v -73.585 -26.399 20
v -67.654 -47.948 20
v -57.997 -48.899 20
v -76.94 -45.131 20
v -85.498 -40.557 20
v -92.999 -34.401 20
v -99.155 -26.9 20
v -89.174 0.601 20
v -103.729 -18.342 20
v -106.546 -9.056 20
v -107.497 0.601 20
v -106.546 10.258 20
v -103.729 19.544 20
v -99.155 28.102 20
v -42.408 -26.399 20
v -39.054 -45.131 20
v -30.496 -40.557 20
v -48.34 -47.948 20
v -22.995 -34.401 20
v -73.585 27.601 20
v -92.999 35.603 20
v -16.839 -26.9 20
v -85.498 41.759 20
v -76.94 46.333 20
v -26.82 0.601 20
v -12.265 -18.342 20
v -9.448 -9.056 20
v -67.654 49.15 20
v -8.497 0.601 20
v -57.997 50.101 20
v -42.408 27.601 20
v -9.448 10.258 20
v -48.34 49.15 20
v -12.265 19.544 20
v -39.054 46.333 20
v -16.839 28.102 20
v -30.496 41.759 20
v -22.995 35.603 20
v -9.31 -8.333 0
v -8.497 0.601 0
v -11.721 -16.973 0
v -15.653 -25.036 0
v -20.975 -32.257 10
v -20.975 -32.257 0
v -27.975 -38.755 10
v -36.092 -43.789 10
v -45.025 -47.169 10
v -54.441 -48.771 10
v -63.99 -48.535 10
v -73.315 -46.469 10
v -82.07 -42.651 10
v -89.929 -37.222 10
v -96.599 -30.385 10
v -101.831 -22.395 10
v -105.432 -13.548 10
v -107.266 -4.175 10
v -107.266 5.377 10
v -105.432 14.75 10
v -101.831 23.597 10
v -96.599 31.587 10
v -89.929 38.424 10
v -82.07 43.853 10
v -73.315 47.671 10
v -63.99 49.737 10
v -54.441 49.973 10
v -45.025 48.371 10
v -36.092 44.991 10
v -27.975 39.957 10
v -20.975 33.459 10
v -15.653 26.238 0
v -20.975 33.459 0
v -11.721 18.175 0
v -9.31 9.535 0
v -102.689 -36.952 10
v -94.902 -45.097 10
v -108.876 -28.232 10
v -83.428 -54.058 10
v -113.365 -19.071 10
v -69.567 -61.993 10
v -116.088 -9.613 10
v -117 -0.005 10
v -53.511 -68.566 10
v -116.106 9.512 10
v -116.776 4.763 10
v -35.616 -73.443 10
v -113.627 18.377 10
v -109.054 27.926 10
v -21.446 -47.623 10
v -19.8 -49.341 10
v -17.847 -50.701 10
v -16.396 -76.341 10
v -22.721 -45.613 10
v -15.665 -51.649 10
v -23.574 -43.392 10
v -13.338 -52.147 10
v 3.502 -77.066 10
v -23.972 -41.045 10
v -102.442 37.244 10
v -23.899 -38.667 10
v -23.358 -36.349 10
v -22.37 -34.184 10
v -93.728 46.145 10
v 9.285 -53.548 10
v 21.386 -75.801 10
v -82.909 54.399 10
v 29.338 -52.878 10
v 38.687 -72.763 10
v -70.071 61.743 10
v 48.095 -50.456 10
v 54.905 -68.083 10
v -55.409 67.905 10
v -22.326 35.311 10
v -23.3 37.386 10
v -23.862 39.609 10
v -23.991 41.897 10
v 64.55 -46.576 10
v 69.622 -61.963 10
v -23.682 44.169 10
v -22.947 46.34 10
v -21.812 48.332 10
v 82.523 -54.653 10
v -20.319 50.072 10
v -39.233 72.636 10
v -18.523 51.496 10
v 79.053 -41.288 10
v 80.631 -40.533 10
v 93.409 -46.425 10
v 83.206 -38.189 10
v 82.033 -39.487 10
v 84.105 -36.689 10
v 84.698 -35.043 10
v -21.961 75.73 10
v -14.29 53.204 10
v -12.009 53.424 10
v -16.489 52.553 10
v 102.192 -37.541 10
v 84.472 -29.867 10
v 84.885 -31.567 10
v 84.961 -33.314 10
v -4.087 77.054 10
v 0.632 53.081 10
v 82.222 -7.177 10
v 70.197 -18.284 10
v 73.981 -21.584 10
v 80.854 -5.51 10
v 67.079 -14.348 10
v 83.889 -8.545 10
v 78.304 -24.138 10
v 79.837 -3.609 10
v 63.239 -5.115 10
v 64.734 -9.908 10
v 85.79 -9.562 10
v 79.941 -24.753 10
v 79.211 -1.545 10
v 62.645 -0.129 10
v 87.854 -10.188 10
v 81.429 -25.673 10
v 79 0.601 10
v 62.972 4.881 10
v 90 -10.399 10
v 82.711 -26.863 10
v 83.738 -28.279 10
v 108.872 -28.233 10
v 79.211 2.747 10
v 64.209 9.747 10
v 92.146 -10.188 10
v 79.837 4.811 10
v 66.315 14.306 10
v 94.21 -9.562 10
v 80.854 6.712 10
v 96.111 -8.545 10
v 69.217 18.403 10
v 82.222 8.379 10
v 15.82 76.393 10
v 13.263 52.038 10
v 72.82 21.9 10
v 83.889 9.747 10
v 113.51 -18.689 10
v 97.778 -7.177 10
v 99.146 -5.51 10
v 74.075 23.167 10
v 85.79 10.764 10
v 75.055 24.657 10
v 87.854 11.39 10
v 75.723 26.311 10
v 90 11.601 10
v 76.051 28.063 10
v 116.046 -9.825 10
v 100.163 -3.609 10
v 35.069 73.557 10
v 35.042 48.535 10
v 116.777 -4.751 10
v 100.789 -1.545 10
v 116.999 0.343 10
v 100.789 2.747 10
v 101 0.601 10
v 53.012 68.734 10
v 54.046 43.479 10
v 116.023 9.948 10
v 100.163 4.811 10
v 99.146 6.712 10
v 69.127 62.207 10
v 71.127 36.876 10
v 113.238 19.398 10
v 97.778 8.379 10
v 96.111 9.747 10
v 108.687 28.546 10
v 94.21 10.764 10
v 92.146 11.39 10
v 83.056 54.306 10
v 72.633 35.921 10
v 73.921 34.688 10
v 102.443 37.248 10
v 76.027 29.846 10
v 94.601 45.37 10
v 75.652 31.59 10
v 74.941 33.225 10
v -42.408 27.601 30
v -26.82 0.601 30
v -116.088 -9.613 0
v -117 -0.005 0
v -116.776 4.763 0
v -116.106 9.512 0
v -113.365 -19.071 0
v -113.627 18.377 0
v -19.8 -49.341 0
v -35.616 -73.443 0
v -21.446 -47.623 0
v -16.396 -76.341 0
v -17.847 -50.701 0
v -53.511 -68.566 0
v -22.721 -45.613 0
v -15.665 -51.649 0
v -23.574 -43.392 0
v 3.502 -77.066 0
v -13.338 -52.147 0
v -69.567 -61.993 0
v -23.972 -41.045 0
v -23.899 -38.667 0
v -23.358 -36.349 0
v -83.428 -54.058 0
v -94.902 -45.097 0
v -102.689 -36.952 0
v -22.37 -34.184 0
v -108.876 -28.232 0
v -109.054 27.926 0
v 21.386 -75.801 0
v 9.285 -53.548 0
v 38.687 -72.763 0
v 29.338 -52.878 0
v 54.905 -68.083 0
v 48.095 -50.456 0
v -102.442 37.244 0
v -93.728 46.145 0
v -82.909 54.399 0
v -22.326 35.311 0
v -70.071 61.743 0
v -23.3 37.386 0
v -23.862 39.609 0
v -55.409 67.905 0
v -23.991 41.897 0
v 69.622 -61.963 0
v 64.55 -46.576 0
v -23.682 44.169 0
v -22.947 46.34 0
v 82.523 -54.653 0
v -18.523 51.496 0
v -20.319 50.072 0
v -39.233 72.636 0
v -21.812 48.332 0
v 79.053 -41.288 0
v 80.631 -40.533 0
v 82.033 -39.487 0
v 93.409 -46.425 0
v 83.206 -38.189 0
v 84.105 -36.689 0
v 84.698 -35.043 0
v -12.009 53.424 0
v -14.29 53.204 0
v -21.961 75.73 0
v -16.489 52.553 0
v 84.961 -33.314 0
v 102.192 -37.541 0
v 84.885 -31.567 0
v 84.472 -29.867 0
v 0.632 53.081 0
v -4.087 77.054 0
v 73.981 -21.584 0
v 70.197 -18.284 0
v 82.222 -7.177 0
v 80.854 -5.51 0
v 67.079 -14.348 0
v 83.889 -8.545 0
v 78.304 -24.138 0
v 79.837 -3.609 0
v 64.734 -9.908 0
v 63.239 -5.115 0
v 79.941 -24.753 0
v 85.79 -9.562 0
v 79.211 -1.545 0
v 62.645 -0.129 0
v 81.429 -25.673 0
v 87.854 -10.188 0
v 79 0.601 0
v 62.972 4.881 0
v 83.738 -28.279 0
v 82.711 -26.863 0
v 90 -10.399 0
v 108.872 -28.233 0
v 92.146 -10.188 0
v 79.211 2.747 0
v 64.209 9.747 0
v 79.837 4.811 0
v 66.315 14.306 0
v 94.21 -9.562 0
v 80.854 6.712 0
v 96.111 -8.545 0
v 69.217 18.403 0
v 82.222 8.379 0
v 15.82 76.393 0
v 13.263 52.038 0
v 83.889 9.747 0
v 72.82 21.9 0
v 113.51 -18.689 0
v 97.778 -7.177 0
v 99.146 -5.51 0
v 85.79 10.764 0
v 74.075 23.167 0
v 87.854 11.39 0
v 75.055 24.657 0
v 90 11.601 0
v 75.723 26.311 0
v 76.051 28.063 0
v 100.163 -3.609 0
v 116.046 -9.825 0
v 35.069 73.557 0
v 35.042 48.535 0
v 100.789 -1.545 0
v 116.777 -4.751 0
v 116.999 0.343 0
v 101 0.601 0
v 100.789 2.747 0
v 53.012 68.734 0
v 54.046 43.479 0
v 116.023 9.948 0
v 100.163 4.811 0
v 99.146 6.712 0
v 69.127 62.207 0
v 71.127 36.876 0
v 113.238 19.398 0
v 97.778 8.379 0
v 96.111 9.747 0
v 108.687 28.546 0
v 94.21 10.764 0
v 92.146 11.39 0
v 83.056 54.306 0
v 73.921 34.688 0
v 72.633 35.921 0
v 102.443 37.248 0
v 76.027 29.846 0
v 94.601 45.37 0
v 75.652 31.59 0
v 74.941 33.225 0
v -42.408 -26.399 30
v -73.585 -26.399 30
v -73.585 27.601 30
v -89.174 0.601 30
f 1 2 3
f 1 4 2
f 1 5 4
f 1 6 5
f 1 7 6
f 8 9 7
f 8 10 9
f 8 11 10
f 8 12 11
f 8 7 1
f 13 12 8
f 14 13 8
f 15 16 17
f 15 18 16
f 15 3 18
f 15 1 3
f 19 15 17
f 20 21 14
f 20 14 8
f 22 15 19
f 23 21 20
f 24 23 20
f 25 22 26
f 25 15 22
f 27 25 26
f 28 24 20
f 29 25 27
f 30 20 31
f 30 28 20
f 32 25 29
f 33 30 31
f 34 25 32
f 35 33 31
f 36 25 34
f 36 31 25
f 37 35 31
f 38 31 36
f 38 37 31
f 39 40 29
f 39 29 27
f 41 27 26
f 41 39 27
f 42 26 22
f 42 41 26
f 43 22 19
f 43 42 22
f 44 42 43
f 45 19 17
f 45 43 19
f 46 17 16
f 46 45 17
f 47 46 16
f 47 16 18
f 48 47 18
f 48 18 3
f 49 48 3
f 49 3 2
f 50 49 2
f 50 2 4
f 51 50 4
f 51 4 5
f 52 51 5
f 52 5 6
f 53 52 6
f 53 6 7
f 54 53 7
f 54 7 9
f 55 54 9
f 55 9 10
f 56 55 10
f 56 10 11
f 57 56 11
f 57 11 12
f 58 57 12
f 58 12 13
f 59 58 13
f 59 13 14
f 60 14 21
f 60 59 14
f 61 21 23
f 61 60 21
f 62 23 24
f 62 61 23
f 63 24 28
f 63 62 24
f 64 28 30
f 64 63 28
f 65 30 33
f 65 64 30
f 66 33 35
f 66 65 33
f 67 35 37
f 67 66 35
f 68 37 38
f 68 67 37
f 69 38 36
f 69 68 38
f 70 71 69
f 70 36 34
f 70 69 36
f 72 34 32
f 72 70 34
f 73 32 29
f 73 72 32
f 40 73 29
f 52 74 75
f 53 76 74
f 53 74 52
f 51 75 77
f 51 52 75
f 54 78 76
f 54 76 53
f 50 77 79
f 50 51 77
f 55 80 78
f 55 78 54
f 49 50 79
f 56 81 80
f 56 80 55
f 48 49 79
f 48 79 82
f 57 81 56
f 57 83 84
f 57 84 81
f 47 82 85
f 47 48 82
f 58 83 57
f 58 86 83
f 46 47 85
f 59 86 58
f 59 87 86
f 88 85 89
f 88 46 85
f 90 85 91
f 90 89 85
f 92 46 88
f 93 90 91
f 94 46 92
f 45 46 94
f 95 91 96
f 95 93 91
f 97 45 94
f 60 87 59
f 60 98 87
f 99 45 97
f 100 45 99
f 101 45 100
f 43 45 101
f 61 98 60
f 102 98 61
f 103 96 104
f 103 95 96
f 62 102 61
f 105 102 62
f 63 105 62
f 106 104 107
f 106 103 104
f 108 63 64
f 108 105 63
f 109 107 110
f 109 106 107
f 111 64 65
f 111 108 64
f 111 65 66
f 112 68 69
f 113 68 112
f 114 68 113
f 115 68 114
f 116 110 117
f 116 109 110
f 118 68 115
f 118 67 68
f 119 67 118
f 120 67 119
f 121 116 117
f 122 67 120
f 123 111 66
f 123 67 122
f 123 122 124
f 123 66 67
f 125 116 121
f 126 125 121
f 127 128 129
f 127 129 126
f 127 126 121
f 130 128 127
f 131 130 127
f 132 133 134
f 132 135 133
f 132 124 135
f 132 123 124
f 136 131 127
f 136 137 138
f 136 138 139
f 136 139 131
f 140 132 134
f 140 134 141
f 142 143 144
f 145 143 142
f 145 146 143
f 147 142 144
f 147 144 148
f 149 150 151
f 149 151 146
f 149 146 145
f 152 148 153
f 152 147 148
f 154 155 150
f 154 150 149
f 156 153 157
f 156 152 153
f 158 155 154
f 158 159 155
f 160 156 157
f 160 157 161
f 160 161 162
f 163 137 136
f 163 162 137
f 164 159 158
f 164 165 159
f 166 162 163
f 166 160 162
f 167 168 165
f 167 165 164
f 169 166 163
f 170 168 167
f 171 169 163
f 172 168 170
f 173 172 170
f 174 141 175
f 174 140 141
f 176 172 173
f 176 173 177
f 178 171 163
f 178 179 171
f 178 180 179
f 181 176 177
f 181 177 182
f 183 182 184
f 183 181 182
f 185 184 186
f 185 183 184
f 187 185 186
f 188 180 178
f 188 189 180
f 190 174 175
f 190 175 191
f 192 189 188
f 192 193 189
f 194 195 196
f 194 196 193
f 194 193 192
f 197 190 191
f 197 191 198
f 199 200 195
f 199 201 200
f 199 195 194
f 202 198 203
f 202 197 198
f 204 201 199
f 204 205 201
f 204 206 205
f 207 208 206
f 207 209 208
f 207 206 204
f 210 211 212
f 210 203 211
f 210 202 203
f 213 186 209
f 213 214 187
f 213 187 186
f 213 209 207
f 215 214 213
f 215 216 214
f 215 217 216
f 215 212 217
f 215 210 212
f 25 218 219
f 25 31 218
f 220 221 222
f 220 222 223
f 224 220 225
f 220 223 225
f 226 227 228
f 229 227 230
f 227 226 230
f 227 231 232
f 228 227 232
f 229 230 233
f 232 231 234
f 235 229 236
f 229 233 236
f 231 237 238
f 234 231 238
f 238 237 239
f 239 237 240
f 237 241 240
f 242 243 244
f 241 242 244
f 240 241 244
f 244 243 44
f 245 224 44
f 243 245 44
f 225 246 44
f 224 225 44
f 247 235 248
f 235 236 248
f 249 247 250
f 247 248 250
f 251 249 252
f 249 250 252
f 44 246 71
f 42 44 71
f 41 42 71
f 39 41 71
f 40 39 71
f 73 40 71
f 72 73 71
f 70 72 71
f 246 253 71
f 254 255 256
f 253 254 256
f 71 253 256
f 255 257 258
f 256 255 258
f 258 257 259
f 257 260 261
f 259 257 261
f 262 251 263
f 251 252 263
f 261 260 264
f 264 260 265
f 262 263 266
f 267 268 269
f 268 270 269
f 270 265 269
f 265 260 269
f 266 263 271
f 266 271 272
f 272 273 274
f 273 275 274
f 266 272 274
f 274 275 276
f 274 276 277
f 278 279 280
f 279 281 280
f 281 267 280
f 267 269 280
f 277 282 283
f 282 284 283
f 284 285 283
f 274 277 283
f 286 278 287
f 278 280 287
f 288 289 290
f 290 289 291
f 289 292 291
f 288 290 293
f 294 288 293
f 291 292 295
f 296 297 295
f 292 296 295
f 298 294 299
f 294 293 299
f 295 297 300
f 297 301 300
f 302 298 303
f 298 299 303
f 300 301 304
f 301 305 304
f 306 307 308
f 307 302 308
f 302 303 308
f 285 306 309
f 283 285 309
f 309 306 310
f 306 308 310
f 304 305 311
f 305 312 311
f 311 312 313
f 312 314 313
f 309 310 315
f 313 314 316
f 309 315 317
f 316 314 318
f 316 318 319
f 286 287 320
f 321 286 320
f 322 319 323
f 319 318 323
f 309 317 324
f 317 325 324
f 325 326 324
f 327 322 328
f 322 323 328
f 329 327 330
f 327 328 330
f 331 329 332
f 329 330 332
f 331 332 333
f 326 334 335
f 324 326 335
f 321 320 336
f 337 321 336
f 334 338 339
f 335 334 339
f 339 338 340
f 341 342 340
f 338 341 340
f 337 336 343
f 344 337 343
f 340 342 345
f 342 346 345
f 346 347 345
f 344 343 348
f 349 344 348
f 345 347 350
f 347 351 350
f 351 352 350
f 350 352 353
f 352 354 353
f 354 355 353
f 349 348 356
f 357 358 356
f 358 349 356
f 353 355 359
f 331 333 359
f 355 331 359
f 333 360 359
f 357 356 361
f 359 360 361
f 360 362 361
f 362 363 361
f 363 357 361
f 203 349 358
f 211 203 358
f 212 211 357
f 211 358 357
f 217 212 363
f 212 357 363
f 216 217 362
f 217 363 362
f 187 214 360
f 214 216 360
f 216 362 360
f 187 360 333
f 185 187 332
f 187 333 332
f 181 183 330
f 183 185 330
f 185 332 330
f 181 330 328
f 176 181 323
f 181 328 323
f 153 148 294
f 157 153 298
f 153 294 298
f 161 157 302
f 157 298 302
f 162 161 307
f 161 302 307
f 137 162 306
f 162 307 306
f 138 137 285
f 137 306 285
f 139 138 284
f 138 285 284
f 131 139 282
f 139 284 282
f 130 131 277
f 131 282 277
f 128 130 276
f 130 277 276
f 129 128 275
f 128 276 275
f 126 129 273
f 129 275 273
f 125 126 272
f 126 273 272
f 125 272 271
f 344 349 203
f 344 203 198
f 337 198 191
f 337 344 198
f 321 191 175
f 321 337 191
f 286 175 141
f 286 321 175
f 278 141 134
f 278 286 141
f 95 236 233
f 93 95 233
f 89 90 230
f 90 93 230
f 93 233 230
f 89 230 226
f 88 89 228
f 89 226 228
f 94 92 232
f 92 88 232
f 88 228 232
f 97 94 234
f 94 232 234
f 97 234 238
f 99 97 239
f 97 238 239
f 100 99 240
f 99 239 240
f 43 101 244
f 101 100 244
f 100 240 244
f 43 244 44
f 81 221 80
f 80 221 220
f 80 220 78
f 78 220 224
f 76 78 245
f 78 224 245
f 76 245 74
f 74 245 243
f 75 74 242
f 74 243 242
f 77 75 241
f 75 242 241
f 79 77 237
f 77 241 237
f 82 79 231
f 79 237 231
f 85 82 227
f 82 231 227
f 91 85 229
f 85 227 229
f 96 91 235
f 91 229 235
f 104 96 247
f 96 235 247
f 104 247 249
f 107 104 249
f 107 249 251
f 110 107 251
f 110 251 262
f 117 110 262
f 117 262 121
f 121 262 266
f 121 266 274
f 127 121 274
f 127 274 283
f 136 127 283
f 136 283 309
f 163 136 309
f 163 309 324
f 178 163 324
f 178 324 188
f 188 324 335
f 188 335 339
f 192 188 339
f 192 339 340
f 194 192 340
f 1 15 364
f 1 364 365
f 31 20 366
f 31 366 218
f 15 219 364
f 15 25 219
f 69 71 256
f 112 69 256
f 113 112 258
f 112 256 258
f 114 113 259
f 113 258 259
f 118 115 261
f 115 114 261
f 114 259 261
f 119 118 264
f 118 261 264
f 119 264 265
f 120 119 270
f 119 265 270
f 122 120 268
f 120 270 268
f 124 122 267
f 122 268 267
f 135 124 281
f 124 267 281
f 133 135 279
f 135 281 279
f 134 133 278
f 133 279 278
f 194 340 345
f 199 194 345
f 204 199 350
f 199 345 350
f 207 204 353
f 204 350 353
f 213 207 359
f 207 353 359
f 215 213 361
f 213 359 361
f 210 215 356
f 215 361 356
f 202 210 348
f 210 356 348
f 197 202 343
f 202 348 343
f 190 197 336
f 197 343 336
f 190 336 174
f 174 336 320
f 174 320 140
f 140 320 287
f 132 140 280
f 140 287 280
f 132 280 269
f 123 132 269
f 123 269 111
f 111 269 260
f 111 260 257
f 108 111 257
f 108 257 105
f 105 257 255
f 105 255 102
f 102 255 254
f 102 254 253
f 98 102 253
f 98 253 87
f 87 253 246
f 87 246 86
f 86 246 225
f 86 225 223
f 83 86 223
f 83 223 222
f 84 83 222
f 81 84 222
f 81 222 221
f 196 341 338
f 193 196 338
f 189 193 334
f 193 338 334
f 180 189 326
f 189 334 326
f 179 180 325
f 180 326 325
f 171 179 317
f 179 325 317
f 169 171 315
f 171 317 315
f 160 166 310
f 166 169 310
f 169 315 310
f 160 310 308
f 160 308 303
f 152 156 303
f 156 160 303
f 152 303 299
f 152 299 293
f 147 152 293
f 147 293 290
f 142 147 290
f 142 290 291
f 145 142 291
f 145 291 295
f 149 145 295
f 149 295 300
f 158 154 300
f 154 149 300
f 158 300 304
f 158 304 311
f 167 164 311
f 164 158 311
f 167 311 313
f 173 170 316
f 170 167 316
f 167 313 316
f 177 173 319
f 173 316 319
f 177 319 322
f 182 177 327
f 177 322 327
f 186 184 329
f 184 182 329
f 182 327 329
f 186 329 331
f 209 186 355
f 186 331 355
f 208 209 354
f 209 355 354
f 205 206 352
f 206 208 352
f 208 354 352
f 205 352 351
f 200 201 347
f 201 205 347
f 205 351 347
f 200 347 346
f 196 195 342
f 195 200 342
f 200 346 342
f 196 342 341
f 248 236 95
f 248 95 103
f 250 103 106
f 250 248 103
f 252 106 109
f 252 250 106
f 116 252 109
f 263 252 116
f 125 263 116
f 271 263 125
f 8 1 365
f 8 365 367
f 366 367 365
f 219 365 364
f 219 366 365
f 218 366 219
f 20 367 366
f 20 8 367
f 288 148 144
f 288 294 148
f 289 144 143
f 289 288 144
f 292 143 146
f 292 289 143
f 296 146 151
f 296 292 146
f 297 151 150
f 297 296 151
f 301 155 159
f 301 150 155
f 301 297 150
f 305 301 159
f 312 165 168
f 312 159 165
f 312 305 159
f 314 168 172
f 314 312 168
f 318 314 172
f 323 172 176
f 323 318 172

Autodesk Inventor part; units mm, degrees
ref_plane "YZ Plane" through (0, 0, 0) normal (1, 0, 0) x (0, 1, 0)
ref_plane "XZ Plane" through (0, 0, 0) normal (0, 1, 0) x (-1, 0, 0)
ref_plane "XY Plane" through (0, 0, 0) normal (0, 0, 1) x (1, 0, 0)
sketch "스케치1" plane through (0, 0, 0) normal (0, 0, 1) x (1, 0, 0)
  point P0 (0, 0)
sketch "스케치2" plane through (0, 0, 0) normal (0, 0, 1) x (1, 0, 0)
  line L0 (-99.4603, 0.601) -> (134.5397, 0.601) construction
  circle A0 centre (-57.9969, 0.601) radius 49.5
  circle A1 centre (90, 0.601) radius 11
  line L1 (-73.5853, 27.601) -> (-42.4084, 27.601)
  line L2 (-42.4084, 27.601) -> (-26.82, 0.601)
  line L3 (-26.82, 0.601) -> (-42.4084, -26.399)
  line L4 (-42.4084, -26.399) -> (-73.5853, -26.399)
  line L5 (-73.5853, -26.399) -> (-89.1738, 0.601)
  line L6 (-89.1738, 0.601) -> (-73.5853, 27.601)
  line L7 (-58.042, 84.9456) -> (-58.042, -105.8358) construction
  line L8 (89.9996, 81.1974) -> (89.9996, -76.9686) construction
  arc A2 (-20.975, -32.2567) -> (-13.3377, -52.1475) centre (-12, -40.2222) ccw
  arc A3 (79.0529, -41.2883) -> (78.3038, -24.1379) centre (75.9743, -32.8313) ccw
  arc A4 (72.8199, 21.9003) -> (71.1275, 36.8763) centre (67.084, 28.8357) ccw
  ellipse E0 centre (0, 0) end of major axis (-117, -0.0052) minor radius 77.101
  line L9 (117, 66.3742) -> (117, -80.3168) construction
  line L10 (-78.2443, 77.101) -> (89.9996, 77.101) construction
  line L11 (0, 100.1745) -> (0, -148.4389) construction
  arc A5 (-12.0086, 53.4242) -> (-20.975, 33.4587) centre (-12, 41.4242) ccw
  ellipse E1 centre (0, 0) end of major axis (-110.153, 7.6024) minor radius 53.1482 (-13.3377, -52.1475) -> (80.2954, -40.7261) ccw
  ellipse E2 centre (0, 0) end of major axis (-110.1827, 7.465) minor radius 53.0214 (71.1275, 36.8763) -> (-12.0086, 53.4242) ccw
  arc A6 (116.9989, 0.3429) -> (117, 0.6731) centre (90, 0.601) ccw
  arc A7 (72.8199, 21.9003) -> (80.5446, -25.078) centre (90, 0.601) ccw
  point P0 (0, 52.7518)
  point P1 (0, 52.7518)
  point P2 (0, 52.7518)
  point P3 (0, 52.7518)
  point P4 (0, 52.7518)
  point P5 (0, 52.7518)
  point P6 (0, 52.7518)
  point P7 (0, 52.7518)
  point P8 (0, 52.7518)
  point P9 (0, 52.7518)
  point P10 (0, 52.7518)
  point P11 (0, 52.7518)
  point P12 (0, 77.101)
  point P13 (0, 52.7518)
  point P14 (0, -77.101)
  point P15 (0, -52.7518)
  point P16 (0, -52.7518)
  point P17 (0, -77.101)
  point P18 (0, -52.7518)
  point P19 (0, -52.7518)
  point P20 (0, -52.7518)
  point P21 (32.4105, -49.2482)
  point P22 (0, -52.7518)
  point P23 (0, -52.7518)
  point P24 (0, -53.101)
  point P25 (0, -77.101)
  dimension "d3" = 99
  dimension "d4" = 58
  dimension "d5" = 22
  dimension "d6" = 54
  dimension "d7" = 90
  dimension "d9" = 24
  dimension "d11" = 18
  dimension "d12" = 18
  dimension "d14" = 76.5
  dimension "d16" = 117
  dimension "d18" = 24
  dimension "d21" = 24
extrude "돌출1" add sketch "스케치2" along normal blind 10 contours E0
extrude "돌출2" add sketch "스케치2" along normal blind 20 contours A0
extrude "돌출3" add sketch "스케치2" along normal blind 30 contours L1 L2 L3 L4 L5 L6
properties part number "스케치03"
